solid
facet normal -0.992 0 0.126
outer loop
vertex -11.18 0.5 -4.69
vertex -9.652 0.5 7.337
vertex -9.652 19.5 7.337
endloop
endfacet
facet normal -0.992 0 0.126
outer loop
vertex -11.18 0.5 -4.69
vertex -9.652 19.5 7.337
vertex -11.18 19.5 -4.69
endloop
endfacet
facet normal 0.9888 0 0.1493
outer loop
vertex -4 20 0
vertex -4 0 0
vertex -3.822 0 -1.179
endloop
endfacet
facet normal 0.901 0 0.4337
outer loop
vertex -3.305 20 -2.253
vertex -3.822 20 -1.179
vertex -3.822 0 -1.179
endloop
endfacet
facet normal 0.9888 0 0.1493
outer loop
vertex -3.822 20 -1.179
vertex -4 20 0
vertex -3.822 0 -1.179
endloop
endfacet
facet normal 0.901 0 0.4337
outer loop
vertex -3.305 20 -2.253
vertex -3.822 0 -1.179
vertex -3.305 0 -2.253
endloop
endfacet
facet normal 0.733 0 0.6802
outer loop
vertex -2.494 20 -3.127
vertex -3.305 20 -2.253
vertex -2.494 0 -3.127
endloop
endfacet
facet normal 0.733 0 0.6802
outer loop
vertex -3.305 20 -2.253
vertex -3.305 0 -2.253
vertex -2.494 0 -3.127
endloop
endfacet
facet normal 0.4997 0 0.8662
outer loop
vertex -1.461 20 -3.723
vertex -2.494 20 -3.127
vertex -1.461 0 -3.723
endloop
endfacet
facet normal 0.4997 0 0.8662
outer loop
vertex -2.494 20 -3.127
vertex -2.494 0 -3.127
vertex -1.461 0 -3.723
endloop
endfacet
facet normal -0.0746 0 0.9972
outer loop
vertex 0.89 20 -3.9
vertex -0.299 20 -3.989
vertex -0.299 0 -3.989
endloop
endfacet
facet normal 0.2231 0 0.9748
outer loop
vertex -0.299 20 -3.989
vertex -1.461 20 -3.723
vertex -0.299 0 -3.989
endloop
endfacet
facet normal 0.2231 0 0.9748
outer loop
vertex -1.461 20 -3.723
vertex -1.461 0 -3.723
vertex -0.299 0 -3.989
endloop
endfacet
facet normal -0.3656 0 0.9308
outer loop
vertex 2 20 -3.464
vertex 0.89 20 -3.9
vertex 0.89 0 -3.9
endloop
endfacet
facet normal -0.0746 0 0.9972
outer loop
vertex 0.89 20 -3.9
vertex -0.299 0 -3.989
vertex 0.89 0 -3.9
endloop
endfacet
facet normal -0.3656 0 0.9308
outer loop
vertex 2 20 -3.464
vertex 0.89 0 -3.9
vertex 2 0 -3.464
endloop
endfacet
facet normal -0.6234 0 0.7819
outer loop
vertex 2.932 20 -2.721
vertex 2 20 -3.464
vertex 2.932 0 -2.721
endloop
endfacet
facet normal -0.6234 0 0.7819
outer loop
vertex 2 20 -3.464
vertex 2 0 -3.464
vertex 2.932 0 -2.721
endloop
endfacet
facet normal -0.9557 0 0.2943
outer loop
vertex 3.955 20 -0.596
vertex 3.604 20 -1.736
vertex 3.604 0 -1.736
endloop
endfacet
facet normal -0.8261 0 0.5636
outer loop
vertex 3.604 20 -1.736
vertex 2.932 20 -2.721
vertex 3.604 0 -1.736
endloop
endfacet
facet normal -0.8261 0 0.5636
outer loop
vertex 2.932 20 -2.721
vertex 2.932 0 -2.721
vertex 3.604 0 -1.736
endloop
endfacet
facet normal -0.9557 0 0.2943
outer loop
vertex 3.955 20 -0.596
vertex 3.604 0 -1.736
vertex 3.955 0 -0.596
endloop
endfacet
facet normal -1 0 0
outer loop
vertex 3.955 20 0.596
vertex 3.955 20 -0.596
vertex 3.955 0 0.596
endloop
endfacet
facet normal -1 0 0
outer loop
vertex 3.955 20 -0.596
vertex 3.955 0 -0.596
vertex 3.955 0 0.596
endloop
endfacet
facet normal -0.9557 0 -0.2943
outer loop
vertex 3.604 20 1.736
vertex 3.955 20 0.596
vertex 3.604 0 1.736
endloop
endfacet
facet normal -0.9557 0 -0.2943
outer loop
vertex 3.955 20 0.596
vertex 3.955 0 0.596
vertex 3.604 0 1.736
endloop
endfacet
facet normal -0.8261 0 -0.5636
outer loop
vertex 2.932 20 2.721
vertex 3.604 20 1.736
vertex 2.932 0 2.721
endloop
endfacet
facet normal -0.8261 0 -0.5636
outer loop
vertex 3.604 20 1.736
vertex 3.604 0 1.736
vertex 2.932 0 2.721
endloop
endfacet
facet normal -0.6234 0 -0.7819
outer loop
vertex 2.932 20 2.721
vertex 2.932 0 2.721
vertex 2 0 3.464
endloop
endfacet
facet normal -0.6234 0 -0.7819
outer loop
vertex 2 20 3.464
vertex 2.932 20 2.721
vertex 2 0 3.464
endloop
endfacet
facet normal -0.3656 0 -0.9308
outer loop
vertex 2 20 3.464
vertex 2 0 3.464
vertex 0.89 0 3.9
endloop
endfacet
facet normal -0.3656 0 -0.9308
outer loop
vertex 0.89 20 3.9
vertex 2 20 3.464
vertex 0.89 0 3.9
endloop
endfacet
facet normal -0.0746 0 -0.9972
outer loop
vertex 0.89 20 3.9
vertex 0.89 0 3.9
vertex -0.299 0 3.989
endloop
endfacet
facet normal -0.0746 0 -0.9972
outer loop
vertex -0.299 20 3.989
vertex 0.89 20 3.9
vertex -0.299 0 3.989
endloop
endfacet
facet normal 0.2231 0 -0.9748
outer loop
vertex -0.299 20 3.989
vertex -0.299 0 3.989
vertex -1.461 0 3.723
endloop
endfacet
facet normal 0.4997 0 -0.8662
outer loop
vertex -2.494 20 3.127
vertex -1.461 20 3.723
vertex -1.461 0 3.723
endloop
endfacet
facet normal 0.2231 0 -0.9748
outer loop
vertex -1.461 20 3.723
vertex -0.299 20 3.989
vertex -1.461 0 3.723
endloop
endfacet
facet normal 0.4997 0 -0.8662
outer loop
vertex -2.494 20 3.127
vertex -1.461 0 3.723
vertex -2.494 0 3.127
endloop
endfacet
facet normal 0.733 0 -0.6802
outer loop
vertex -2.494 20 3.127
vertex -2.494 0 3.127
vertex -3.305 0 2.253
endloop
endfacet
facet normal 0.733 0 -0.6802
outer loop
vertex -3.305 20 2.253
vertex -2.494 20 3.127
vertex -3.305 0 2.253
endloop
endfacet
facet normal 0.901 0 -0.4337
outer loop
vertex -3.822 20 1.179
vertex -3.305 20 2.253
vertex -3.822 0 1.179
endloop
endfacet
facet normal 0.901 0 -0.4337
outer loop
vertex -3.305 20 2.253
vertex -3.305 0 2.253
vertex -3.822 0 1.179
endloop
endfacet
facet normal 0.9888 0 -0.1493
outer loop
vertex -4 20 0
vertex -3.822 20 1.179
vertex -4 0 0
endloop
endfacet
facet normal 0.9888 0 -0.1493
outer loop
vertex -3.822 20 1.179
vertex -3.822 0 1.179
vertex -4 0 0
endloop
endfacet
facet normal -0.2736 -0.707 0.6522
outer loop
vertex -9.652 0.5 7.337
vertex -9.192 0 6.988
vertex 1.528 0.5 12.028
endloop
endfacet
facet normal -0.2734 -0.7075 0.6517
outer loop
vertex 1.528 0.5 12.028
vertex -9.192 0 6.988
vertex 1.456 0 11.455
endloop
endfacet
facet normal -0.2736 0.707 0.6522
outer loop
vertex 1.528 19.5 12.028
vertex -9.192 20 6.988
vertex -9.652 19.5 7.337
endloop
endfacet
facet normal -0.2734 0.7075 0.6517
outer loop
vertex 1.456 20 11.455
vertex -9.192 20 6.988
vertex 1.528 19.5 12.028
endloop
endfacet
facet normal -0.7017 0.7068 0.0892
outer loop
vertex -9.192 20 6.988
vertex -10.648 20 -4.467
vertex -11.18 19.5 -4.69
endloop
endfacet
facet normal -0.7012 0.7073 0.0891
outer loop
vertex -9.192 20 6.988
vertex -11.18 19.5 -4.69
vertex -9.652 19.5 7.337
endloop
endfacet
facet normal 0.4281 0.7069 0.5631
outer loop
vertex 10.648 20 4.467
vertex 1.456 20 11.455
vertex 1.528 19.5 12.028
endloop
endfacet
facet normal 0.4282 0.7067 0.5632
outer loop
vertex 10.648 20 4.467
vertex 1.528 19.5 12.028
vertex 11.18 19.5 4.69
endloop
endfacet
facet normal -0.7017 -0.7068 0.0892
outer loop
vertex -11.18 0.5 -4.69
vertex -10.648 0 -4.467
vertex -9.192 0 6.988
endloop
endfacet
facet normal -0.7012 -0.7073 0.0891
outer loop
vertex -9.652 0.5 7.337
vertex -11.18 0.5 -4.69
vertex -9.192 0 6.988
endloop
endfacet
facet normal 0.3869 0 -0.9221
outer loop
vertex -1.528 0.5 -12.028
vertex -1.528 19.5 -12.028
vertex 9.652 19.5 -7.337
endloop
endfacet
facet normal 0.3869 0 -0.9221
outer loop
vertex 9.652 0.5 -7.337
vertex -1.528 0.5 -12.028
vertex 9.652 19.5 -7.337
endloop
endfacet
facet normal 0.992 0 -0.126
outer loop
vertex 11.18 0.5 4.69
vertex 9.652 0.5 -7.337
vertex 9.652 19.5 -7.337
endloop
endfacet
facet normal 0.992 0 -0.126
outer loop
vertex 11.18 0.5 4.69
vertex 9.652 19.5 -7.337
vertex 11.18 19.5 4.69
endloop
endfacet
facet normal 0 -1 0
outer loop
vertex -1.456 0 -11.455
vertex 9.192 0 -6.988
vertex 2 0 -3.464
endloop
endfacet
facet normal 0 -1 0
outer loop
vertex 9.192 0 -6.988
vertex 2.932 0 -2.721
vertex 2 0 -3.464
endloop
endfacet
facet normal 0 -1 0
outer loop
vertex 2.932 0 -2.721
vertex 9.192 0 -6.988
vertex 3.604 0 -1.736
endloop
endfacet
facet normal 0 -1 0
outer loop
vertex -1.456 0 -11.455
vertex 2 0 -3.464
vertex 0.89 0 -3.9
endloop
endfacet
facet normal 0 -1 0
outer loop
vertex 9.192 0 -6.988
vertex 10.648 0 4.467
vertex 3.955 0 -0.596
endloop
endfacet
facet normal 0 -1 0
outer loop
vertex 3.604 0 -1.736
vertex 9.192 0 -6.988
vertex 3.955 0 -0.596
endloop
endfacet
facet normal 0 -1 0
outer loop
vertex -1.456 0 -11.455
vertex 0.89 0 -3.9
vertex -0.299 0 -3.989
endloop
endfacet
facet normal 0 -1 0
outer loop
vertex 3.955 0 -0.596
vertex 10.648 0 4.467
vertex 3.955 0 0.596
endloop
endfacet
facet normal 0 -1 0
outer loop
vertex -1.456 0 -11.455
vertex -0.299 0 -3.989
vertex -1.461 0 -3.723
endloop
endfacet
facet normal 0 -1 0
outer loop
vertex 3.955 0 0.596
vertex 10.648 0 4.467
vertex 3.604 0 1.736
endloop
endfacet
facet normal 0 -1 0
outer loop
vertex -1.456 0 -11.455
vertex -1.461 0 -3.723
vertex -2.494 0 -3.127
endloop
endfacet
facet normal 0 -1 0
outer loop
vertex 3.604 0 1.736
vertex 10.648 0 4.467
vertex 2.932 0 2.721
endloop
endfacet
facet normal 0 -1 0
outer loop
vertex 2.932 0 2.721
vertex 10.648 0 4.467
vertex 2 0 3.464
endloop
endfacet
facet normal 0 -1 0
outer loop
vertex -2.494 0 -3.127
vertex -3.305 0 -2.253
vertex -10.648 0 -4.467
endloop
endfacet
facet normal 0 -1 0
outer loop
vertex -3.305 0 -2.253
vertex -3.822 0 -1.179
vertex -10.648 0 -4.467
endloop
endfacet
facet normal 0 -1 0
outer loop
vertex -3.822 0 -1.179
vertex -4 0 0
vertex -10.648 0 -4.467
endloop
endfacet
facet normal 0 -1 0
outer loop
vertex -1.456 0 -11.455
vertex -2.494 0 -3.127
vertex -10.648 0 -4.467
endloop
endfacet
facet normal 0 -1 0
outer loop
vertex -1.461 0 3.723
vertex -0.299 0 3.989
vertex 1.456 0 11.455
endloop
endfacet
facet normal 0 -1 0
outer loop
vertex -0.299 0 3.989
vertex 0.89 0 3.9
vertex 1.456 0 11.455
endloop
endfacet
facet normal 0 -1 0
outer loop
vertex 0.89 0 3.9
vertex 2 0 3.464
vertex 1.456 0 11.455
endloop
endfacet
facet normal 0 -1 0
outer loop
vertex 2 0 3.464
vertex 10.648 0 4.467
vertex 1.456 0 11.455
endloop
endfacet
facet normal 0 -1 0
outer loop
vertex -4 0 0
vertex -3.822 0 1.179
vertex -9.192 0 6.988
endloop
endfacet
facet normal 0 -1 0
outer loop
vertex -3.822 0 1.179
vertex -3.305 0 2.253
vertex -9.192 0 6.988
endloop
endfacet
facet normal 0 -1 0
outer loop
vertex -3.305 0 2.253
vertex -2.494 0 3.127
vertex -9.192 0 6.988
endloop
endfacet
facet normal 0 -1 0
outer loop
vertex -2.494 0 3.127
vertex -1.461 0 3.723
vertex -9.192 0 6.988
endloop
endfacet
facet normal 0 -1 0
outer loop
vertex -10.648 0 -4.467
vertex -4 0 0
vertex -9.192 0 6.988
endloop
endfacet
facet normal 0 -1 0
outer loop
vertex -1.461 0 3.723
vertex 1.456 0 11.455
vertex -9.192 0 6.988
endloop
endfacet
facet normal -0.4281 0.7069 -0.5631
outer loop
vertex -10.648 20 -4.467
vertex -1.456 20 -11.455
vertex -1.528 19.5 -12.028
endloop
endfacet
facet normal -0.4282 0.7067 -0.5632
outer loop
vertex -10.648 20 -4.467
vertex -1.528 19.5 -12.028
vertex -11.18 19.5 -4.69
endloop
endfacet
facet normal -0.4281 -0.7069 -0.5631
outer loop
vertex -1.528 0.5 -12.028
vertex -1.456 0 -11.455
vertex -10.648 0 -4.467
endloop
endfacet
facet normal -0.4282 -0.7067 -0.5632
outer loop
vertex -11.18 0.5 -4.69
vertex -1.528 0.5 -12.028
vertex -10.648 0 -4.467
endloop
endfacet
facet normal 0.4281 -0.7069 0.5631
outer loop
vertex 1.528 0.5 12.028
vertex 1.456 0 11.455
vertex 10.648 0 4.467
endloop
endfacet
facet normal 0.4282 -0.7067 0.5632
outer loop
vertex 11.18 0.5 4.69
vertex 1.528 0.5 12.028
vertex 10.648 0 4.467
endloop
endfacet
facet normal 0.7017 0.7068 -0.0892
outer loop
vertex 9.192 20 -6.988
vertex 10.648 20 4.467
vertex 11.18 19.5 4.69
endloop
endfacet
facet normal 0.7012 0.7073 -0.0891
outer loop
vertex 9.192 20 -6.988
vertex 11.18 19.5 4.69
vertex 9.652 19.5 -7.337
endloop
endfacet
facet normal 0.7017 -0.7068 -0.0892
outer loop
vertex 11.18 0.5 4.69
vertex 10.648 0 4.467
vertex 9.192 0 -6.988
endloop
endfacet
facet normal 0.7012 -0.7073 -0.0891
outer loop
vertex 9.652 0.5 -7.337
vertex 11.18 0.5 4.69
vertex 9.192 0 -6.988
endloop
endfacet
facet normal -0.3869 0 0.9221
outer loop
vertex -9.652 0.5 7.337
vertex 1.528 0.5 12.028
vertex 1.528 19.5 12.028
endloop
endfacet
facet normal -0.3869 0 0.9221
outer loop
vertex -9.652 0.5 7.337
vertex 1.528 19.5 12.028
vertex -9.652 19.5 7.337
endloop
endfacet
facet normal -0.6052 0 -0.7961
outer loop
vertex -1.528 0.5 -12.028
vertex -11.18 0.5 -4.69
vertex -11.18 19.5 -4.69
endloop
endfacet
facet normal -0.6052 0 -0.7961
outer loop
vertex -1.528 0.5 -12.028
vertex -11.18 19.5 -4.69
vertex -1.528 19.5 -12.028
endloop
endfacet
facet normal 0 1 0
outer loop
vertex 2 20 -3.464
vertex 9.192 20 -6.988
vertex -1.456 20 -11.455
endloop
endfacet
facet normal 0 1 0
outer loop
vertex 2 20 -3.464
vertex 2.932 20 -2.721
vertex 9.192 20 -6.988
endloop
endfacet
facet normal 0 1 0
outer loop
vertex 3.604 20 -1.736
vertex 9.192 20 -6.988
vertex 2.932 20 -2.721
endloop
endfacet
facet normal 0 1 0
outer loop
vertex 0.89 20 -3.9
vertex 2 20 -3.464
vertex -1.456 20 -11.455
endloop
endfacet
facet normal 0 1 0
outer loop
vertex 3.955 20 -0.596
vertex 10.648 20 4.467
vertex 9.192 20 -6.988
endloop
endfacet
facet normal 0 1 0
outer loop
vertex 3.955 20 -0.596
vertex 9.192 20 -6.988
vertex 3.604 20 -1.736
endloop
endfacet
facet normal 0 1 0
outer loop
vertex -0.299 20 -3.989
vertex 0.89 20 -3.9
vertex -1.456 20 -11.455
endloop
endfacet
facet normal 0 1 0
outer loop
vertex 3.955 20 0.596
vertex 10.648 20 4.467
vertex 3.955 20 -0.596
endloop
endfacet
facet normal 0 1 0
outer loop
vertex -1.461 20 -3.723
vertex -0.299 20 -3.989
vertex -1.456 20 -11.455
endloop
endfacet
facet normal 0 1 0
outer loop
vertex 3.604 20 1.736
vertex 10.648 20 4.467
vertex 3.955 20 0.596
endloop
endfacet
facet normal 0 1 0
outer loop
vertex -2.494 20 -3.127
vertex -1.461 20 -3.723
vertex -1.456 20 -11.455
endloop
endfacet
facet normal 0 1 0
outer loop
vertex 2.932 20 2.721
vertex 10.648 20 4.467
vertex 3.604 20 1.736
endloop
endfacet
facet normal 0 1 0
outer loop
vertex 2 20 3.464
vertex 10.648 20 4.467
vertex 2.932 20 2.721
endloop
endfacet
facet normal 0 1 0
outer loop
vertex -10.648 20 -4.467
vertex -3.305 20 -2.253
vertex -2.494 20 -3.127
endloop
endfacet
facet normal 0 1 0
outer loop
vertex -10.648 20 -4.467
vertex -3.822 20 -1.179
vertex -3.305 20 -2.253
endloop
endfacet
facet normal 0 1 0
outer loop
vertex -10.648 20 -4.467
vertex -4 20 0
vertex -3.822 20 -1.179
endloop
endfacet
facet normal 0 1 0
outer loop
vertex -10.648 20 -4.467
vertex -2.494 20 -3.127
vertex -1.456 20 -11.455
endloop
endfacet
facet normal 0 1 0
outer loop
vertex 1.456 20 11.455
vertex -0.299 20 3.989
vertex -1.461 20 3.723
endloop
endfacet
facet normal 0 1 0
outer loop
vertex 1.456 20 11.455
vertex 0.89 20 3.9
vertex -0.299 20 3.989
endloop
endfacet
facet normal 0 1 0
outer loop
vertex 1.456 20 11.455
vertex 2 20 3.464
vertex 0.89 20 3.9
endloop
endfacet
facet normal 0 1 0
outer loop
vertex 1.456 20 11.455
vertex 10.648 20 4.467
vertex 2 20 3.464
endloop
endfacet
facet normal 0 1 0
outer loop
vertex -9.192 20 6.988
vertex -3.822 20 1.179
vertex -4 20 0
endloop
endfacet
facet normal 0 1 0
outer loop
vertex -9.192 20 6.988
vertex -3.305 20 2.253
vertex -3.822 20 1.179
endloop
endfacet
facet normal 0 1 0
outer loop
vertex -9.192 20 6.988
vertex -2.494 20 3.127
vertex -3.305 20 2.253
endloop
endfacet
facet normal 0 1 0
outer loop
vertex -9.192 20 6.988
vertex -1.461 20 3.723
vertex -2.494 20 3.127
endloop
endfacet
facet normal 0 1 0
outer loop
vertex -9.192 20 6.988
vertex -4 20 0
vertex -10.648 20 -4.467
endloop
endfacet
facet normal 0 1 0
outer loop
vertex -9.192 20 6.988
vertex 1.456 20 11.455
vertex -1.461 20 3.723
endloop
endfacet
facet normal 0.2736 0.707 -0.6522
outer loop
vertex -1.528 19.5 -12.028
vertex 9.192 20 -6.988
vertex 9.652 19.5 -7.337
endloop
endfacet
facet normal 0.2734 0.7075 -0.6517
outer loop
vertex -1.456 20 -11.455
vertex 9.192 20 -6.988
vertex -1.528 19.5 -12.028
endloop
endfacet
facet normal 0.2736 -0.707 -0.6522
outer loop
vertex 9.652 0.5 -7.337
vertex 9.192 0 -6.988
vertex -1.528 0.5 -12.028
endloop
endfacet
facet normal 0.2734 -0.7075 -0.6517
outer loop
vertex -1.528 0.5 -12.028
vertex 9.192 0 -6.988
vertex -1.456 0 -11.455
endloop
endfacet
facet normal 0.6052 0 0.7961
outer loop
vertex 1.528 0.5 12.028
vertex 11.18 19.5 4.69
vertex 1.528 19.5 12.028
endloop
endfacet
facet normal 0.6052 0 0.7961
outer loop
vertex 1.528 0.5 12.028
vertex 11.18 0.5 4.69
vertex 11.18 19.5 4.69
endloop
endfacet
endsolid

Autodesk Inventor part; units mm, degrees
ref_plane "YZ Plane" through (0, 0, 0) normal (1, 0, 0) x (0, 1, 0)
ref_plane "XZ Plane" through (0, 0, 0) normal (0, 1, 0) x (-1, 0, 0)
ref_plane "XY Plane" through (0, 0, 0) normal (0, 0, 1) x (1, 0, 0)
sketch "Sketch1" plane through (0, 0, 0) normal (0, 1, 0) x (-1, 0, 0)
  circle A0 centre (0, 0) radius 4
  line L0 (11.1804, -4.6903) -> (1.5283, -12.0276)
  line L1 (1.5283, -12.0276) -> (-9.6521, -7.3374)
  line L2 (-9.6521, -7.3374) -> (-11.1804, 4.6903)
  line L3 (-11.1804, 4.6903) -> (-1.5283, 12.0276)
  line L4 (-1.5283, 12.0276) -> (9.6521, 7.3374)
  line L5 (9.6521, 7.3374) -> (11.1804, -4.6903)
  dimension "d0" = 8
  dimension "d19" = 10.5
extrude "Extrusion1" add sketch "Sketch1" along normal blind 20
thread "Thread1" size "M5x0.8" class "6H" standard "ANSI Metric M Profile" full length
chamfer "Chamfer1" distance 0.5 angle 45 12 edges at (-4.0619, 0, 9.6825) (6.3543, 0, 8.359) (10.4162, 0, -1.3235) (4.0619, 0, -9.6825) (-6.3543, 0, -8.359) (-10.4162, 0, 1.3235) (-4.0619, 20, 9.6825) (-10.4162, 20, 1.3235) (6.3543, 20, 8.359) (-6.3543, 20, -8.359) (4.0619, 20, -9.6825) (10.4162, 20, -1.3235)
properties part number "5M nut 20mm" material "Iron, Gray"
